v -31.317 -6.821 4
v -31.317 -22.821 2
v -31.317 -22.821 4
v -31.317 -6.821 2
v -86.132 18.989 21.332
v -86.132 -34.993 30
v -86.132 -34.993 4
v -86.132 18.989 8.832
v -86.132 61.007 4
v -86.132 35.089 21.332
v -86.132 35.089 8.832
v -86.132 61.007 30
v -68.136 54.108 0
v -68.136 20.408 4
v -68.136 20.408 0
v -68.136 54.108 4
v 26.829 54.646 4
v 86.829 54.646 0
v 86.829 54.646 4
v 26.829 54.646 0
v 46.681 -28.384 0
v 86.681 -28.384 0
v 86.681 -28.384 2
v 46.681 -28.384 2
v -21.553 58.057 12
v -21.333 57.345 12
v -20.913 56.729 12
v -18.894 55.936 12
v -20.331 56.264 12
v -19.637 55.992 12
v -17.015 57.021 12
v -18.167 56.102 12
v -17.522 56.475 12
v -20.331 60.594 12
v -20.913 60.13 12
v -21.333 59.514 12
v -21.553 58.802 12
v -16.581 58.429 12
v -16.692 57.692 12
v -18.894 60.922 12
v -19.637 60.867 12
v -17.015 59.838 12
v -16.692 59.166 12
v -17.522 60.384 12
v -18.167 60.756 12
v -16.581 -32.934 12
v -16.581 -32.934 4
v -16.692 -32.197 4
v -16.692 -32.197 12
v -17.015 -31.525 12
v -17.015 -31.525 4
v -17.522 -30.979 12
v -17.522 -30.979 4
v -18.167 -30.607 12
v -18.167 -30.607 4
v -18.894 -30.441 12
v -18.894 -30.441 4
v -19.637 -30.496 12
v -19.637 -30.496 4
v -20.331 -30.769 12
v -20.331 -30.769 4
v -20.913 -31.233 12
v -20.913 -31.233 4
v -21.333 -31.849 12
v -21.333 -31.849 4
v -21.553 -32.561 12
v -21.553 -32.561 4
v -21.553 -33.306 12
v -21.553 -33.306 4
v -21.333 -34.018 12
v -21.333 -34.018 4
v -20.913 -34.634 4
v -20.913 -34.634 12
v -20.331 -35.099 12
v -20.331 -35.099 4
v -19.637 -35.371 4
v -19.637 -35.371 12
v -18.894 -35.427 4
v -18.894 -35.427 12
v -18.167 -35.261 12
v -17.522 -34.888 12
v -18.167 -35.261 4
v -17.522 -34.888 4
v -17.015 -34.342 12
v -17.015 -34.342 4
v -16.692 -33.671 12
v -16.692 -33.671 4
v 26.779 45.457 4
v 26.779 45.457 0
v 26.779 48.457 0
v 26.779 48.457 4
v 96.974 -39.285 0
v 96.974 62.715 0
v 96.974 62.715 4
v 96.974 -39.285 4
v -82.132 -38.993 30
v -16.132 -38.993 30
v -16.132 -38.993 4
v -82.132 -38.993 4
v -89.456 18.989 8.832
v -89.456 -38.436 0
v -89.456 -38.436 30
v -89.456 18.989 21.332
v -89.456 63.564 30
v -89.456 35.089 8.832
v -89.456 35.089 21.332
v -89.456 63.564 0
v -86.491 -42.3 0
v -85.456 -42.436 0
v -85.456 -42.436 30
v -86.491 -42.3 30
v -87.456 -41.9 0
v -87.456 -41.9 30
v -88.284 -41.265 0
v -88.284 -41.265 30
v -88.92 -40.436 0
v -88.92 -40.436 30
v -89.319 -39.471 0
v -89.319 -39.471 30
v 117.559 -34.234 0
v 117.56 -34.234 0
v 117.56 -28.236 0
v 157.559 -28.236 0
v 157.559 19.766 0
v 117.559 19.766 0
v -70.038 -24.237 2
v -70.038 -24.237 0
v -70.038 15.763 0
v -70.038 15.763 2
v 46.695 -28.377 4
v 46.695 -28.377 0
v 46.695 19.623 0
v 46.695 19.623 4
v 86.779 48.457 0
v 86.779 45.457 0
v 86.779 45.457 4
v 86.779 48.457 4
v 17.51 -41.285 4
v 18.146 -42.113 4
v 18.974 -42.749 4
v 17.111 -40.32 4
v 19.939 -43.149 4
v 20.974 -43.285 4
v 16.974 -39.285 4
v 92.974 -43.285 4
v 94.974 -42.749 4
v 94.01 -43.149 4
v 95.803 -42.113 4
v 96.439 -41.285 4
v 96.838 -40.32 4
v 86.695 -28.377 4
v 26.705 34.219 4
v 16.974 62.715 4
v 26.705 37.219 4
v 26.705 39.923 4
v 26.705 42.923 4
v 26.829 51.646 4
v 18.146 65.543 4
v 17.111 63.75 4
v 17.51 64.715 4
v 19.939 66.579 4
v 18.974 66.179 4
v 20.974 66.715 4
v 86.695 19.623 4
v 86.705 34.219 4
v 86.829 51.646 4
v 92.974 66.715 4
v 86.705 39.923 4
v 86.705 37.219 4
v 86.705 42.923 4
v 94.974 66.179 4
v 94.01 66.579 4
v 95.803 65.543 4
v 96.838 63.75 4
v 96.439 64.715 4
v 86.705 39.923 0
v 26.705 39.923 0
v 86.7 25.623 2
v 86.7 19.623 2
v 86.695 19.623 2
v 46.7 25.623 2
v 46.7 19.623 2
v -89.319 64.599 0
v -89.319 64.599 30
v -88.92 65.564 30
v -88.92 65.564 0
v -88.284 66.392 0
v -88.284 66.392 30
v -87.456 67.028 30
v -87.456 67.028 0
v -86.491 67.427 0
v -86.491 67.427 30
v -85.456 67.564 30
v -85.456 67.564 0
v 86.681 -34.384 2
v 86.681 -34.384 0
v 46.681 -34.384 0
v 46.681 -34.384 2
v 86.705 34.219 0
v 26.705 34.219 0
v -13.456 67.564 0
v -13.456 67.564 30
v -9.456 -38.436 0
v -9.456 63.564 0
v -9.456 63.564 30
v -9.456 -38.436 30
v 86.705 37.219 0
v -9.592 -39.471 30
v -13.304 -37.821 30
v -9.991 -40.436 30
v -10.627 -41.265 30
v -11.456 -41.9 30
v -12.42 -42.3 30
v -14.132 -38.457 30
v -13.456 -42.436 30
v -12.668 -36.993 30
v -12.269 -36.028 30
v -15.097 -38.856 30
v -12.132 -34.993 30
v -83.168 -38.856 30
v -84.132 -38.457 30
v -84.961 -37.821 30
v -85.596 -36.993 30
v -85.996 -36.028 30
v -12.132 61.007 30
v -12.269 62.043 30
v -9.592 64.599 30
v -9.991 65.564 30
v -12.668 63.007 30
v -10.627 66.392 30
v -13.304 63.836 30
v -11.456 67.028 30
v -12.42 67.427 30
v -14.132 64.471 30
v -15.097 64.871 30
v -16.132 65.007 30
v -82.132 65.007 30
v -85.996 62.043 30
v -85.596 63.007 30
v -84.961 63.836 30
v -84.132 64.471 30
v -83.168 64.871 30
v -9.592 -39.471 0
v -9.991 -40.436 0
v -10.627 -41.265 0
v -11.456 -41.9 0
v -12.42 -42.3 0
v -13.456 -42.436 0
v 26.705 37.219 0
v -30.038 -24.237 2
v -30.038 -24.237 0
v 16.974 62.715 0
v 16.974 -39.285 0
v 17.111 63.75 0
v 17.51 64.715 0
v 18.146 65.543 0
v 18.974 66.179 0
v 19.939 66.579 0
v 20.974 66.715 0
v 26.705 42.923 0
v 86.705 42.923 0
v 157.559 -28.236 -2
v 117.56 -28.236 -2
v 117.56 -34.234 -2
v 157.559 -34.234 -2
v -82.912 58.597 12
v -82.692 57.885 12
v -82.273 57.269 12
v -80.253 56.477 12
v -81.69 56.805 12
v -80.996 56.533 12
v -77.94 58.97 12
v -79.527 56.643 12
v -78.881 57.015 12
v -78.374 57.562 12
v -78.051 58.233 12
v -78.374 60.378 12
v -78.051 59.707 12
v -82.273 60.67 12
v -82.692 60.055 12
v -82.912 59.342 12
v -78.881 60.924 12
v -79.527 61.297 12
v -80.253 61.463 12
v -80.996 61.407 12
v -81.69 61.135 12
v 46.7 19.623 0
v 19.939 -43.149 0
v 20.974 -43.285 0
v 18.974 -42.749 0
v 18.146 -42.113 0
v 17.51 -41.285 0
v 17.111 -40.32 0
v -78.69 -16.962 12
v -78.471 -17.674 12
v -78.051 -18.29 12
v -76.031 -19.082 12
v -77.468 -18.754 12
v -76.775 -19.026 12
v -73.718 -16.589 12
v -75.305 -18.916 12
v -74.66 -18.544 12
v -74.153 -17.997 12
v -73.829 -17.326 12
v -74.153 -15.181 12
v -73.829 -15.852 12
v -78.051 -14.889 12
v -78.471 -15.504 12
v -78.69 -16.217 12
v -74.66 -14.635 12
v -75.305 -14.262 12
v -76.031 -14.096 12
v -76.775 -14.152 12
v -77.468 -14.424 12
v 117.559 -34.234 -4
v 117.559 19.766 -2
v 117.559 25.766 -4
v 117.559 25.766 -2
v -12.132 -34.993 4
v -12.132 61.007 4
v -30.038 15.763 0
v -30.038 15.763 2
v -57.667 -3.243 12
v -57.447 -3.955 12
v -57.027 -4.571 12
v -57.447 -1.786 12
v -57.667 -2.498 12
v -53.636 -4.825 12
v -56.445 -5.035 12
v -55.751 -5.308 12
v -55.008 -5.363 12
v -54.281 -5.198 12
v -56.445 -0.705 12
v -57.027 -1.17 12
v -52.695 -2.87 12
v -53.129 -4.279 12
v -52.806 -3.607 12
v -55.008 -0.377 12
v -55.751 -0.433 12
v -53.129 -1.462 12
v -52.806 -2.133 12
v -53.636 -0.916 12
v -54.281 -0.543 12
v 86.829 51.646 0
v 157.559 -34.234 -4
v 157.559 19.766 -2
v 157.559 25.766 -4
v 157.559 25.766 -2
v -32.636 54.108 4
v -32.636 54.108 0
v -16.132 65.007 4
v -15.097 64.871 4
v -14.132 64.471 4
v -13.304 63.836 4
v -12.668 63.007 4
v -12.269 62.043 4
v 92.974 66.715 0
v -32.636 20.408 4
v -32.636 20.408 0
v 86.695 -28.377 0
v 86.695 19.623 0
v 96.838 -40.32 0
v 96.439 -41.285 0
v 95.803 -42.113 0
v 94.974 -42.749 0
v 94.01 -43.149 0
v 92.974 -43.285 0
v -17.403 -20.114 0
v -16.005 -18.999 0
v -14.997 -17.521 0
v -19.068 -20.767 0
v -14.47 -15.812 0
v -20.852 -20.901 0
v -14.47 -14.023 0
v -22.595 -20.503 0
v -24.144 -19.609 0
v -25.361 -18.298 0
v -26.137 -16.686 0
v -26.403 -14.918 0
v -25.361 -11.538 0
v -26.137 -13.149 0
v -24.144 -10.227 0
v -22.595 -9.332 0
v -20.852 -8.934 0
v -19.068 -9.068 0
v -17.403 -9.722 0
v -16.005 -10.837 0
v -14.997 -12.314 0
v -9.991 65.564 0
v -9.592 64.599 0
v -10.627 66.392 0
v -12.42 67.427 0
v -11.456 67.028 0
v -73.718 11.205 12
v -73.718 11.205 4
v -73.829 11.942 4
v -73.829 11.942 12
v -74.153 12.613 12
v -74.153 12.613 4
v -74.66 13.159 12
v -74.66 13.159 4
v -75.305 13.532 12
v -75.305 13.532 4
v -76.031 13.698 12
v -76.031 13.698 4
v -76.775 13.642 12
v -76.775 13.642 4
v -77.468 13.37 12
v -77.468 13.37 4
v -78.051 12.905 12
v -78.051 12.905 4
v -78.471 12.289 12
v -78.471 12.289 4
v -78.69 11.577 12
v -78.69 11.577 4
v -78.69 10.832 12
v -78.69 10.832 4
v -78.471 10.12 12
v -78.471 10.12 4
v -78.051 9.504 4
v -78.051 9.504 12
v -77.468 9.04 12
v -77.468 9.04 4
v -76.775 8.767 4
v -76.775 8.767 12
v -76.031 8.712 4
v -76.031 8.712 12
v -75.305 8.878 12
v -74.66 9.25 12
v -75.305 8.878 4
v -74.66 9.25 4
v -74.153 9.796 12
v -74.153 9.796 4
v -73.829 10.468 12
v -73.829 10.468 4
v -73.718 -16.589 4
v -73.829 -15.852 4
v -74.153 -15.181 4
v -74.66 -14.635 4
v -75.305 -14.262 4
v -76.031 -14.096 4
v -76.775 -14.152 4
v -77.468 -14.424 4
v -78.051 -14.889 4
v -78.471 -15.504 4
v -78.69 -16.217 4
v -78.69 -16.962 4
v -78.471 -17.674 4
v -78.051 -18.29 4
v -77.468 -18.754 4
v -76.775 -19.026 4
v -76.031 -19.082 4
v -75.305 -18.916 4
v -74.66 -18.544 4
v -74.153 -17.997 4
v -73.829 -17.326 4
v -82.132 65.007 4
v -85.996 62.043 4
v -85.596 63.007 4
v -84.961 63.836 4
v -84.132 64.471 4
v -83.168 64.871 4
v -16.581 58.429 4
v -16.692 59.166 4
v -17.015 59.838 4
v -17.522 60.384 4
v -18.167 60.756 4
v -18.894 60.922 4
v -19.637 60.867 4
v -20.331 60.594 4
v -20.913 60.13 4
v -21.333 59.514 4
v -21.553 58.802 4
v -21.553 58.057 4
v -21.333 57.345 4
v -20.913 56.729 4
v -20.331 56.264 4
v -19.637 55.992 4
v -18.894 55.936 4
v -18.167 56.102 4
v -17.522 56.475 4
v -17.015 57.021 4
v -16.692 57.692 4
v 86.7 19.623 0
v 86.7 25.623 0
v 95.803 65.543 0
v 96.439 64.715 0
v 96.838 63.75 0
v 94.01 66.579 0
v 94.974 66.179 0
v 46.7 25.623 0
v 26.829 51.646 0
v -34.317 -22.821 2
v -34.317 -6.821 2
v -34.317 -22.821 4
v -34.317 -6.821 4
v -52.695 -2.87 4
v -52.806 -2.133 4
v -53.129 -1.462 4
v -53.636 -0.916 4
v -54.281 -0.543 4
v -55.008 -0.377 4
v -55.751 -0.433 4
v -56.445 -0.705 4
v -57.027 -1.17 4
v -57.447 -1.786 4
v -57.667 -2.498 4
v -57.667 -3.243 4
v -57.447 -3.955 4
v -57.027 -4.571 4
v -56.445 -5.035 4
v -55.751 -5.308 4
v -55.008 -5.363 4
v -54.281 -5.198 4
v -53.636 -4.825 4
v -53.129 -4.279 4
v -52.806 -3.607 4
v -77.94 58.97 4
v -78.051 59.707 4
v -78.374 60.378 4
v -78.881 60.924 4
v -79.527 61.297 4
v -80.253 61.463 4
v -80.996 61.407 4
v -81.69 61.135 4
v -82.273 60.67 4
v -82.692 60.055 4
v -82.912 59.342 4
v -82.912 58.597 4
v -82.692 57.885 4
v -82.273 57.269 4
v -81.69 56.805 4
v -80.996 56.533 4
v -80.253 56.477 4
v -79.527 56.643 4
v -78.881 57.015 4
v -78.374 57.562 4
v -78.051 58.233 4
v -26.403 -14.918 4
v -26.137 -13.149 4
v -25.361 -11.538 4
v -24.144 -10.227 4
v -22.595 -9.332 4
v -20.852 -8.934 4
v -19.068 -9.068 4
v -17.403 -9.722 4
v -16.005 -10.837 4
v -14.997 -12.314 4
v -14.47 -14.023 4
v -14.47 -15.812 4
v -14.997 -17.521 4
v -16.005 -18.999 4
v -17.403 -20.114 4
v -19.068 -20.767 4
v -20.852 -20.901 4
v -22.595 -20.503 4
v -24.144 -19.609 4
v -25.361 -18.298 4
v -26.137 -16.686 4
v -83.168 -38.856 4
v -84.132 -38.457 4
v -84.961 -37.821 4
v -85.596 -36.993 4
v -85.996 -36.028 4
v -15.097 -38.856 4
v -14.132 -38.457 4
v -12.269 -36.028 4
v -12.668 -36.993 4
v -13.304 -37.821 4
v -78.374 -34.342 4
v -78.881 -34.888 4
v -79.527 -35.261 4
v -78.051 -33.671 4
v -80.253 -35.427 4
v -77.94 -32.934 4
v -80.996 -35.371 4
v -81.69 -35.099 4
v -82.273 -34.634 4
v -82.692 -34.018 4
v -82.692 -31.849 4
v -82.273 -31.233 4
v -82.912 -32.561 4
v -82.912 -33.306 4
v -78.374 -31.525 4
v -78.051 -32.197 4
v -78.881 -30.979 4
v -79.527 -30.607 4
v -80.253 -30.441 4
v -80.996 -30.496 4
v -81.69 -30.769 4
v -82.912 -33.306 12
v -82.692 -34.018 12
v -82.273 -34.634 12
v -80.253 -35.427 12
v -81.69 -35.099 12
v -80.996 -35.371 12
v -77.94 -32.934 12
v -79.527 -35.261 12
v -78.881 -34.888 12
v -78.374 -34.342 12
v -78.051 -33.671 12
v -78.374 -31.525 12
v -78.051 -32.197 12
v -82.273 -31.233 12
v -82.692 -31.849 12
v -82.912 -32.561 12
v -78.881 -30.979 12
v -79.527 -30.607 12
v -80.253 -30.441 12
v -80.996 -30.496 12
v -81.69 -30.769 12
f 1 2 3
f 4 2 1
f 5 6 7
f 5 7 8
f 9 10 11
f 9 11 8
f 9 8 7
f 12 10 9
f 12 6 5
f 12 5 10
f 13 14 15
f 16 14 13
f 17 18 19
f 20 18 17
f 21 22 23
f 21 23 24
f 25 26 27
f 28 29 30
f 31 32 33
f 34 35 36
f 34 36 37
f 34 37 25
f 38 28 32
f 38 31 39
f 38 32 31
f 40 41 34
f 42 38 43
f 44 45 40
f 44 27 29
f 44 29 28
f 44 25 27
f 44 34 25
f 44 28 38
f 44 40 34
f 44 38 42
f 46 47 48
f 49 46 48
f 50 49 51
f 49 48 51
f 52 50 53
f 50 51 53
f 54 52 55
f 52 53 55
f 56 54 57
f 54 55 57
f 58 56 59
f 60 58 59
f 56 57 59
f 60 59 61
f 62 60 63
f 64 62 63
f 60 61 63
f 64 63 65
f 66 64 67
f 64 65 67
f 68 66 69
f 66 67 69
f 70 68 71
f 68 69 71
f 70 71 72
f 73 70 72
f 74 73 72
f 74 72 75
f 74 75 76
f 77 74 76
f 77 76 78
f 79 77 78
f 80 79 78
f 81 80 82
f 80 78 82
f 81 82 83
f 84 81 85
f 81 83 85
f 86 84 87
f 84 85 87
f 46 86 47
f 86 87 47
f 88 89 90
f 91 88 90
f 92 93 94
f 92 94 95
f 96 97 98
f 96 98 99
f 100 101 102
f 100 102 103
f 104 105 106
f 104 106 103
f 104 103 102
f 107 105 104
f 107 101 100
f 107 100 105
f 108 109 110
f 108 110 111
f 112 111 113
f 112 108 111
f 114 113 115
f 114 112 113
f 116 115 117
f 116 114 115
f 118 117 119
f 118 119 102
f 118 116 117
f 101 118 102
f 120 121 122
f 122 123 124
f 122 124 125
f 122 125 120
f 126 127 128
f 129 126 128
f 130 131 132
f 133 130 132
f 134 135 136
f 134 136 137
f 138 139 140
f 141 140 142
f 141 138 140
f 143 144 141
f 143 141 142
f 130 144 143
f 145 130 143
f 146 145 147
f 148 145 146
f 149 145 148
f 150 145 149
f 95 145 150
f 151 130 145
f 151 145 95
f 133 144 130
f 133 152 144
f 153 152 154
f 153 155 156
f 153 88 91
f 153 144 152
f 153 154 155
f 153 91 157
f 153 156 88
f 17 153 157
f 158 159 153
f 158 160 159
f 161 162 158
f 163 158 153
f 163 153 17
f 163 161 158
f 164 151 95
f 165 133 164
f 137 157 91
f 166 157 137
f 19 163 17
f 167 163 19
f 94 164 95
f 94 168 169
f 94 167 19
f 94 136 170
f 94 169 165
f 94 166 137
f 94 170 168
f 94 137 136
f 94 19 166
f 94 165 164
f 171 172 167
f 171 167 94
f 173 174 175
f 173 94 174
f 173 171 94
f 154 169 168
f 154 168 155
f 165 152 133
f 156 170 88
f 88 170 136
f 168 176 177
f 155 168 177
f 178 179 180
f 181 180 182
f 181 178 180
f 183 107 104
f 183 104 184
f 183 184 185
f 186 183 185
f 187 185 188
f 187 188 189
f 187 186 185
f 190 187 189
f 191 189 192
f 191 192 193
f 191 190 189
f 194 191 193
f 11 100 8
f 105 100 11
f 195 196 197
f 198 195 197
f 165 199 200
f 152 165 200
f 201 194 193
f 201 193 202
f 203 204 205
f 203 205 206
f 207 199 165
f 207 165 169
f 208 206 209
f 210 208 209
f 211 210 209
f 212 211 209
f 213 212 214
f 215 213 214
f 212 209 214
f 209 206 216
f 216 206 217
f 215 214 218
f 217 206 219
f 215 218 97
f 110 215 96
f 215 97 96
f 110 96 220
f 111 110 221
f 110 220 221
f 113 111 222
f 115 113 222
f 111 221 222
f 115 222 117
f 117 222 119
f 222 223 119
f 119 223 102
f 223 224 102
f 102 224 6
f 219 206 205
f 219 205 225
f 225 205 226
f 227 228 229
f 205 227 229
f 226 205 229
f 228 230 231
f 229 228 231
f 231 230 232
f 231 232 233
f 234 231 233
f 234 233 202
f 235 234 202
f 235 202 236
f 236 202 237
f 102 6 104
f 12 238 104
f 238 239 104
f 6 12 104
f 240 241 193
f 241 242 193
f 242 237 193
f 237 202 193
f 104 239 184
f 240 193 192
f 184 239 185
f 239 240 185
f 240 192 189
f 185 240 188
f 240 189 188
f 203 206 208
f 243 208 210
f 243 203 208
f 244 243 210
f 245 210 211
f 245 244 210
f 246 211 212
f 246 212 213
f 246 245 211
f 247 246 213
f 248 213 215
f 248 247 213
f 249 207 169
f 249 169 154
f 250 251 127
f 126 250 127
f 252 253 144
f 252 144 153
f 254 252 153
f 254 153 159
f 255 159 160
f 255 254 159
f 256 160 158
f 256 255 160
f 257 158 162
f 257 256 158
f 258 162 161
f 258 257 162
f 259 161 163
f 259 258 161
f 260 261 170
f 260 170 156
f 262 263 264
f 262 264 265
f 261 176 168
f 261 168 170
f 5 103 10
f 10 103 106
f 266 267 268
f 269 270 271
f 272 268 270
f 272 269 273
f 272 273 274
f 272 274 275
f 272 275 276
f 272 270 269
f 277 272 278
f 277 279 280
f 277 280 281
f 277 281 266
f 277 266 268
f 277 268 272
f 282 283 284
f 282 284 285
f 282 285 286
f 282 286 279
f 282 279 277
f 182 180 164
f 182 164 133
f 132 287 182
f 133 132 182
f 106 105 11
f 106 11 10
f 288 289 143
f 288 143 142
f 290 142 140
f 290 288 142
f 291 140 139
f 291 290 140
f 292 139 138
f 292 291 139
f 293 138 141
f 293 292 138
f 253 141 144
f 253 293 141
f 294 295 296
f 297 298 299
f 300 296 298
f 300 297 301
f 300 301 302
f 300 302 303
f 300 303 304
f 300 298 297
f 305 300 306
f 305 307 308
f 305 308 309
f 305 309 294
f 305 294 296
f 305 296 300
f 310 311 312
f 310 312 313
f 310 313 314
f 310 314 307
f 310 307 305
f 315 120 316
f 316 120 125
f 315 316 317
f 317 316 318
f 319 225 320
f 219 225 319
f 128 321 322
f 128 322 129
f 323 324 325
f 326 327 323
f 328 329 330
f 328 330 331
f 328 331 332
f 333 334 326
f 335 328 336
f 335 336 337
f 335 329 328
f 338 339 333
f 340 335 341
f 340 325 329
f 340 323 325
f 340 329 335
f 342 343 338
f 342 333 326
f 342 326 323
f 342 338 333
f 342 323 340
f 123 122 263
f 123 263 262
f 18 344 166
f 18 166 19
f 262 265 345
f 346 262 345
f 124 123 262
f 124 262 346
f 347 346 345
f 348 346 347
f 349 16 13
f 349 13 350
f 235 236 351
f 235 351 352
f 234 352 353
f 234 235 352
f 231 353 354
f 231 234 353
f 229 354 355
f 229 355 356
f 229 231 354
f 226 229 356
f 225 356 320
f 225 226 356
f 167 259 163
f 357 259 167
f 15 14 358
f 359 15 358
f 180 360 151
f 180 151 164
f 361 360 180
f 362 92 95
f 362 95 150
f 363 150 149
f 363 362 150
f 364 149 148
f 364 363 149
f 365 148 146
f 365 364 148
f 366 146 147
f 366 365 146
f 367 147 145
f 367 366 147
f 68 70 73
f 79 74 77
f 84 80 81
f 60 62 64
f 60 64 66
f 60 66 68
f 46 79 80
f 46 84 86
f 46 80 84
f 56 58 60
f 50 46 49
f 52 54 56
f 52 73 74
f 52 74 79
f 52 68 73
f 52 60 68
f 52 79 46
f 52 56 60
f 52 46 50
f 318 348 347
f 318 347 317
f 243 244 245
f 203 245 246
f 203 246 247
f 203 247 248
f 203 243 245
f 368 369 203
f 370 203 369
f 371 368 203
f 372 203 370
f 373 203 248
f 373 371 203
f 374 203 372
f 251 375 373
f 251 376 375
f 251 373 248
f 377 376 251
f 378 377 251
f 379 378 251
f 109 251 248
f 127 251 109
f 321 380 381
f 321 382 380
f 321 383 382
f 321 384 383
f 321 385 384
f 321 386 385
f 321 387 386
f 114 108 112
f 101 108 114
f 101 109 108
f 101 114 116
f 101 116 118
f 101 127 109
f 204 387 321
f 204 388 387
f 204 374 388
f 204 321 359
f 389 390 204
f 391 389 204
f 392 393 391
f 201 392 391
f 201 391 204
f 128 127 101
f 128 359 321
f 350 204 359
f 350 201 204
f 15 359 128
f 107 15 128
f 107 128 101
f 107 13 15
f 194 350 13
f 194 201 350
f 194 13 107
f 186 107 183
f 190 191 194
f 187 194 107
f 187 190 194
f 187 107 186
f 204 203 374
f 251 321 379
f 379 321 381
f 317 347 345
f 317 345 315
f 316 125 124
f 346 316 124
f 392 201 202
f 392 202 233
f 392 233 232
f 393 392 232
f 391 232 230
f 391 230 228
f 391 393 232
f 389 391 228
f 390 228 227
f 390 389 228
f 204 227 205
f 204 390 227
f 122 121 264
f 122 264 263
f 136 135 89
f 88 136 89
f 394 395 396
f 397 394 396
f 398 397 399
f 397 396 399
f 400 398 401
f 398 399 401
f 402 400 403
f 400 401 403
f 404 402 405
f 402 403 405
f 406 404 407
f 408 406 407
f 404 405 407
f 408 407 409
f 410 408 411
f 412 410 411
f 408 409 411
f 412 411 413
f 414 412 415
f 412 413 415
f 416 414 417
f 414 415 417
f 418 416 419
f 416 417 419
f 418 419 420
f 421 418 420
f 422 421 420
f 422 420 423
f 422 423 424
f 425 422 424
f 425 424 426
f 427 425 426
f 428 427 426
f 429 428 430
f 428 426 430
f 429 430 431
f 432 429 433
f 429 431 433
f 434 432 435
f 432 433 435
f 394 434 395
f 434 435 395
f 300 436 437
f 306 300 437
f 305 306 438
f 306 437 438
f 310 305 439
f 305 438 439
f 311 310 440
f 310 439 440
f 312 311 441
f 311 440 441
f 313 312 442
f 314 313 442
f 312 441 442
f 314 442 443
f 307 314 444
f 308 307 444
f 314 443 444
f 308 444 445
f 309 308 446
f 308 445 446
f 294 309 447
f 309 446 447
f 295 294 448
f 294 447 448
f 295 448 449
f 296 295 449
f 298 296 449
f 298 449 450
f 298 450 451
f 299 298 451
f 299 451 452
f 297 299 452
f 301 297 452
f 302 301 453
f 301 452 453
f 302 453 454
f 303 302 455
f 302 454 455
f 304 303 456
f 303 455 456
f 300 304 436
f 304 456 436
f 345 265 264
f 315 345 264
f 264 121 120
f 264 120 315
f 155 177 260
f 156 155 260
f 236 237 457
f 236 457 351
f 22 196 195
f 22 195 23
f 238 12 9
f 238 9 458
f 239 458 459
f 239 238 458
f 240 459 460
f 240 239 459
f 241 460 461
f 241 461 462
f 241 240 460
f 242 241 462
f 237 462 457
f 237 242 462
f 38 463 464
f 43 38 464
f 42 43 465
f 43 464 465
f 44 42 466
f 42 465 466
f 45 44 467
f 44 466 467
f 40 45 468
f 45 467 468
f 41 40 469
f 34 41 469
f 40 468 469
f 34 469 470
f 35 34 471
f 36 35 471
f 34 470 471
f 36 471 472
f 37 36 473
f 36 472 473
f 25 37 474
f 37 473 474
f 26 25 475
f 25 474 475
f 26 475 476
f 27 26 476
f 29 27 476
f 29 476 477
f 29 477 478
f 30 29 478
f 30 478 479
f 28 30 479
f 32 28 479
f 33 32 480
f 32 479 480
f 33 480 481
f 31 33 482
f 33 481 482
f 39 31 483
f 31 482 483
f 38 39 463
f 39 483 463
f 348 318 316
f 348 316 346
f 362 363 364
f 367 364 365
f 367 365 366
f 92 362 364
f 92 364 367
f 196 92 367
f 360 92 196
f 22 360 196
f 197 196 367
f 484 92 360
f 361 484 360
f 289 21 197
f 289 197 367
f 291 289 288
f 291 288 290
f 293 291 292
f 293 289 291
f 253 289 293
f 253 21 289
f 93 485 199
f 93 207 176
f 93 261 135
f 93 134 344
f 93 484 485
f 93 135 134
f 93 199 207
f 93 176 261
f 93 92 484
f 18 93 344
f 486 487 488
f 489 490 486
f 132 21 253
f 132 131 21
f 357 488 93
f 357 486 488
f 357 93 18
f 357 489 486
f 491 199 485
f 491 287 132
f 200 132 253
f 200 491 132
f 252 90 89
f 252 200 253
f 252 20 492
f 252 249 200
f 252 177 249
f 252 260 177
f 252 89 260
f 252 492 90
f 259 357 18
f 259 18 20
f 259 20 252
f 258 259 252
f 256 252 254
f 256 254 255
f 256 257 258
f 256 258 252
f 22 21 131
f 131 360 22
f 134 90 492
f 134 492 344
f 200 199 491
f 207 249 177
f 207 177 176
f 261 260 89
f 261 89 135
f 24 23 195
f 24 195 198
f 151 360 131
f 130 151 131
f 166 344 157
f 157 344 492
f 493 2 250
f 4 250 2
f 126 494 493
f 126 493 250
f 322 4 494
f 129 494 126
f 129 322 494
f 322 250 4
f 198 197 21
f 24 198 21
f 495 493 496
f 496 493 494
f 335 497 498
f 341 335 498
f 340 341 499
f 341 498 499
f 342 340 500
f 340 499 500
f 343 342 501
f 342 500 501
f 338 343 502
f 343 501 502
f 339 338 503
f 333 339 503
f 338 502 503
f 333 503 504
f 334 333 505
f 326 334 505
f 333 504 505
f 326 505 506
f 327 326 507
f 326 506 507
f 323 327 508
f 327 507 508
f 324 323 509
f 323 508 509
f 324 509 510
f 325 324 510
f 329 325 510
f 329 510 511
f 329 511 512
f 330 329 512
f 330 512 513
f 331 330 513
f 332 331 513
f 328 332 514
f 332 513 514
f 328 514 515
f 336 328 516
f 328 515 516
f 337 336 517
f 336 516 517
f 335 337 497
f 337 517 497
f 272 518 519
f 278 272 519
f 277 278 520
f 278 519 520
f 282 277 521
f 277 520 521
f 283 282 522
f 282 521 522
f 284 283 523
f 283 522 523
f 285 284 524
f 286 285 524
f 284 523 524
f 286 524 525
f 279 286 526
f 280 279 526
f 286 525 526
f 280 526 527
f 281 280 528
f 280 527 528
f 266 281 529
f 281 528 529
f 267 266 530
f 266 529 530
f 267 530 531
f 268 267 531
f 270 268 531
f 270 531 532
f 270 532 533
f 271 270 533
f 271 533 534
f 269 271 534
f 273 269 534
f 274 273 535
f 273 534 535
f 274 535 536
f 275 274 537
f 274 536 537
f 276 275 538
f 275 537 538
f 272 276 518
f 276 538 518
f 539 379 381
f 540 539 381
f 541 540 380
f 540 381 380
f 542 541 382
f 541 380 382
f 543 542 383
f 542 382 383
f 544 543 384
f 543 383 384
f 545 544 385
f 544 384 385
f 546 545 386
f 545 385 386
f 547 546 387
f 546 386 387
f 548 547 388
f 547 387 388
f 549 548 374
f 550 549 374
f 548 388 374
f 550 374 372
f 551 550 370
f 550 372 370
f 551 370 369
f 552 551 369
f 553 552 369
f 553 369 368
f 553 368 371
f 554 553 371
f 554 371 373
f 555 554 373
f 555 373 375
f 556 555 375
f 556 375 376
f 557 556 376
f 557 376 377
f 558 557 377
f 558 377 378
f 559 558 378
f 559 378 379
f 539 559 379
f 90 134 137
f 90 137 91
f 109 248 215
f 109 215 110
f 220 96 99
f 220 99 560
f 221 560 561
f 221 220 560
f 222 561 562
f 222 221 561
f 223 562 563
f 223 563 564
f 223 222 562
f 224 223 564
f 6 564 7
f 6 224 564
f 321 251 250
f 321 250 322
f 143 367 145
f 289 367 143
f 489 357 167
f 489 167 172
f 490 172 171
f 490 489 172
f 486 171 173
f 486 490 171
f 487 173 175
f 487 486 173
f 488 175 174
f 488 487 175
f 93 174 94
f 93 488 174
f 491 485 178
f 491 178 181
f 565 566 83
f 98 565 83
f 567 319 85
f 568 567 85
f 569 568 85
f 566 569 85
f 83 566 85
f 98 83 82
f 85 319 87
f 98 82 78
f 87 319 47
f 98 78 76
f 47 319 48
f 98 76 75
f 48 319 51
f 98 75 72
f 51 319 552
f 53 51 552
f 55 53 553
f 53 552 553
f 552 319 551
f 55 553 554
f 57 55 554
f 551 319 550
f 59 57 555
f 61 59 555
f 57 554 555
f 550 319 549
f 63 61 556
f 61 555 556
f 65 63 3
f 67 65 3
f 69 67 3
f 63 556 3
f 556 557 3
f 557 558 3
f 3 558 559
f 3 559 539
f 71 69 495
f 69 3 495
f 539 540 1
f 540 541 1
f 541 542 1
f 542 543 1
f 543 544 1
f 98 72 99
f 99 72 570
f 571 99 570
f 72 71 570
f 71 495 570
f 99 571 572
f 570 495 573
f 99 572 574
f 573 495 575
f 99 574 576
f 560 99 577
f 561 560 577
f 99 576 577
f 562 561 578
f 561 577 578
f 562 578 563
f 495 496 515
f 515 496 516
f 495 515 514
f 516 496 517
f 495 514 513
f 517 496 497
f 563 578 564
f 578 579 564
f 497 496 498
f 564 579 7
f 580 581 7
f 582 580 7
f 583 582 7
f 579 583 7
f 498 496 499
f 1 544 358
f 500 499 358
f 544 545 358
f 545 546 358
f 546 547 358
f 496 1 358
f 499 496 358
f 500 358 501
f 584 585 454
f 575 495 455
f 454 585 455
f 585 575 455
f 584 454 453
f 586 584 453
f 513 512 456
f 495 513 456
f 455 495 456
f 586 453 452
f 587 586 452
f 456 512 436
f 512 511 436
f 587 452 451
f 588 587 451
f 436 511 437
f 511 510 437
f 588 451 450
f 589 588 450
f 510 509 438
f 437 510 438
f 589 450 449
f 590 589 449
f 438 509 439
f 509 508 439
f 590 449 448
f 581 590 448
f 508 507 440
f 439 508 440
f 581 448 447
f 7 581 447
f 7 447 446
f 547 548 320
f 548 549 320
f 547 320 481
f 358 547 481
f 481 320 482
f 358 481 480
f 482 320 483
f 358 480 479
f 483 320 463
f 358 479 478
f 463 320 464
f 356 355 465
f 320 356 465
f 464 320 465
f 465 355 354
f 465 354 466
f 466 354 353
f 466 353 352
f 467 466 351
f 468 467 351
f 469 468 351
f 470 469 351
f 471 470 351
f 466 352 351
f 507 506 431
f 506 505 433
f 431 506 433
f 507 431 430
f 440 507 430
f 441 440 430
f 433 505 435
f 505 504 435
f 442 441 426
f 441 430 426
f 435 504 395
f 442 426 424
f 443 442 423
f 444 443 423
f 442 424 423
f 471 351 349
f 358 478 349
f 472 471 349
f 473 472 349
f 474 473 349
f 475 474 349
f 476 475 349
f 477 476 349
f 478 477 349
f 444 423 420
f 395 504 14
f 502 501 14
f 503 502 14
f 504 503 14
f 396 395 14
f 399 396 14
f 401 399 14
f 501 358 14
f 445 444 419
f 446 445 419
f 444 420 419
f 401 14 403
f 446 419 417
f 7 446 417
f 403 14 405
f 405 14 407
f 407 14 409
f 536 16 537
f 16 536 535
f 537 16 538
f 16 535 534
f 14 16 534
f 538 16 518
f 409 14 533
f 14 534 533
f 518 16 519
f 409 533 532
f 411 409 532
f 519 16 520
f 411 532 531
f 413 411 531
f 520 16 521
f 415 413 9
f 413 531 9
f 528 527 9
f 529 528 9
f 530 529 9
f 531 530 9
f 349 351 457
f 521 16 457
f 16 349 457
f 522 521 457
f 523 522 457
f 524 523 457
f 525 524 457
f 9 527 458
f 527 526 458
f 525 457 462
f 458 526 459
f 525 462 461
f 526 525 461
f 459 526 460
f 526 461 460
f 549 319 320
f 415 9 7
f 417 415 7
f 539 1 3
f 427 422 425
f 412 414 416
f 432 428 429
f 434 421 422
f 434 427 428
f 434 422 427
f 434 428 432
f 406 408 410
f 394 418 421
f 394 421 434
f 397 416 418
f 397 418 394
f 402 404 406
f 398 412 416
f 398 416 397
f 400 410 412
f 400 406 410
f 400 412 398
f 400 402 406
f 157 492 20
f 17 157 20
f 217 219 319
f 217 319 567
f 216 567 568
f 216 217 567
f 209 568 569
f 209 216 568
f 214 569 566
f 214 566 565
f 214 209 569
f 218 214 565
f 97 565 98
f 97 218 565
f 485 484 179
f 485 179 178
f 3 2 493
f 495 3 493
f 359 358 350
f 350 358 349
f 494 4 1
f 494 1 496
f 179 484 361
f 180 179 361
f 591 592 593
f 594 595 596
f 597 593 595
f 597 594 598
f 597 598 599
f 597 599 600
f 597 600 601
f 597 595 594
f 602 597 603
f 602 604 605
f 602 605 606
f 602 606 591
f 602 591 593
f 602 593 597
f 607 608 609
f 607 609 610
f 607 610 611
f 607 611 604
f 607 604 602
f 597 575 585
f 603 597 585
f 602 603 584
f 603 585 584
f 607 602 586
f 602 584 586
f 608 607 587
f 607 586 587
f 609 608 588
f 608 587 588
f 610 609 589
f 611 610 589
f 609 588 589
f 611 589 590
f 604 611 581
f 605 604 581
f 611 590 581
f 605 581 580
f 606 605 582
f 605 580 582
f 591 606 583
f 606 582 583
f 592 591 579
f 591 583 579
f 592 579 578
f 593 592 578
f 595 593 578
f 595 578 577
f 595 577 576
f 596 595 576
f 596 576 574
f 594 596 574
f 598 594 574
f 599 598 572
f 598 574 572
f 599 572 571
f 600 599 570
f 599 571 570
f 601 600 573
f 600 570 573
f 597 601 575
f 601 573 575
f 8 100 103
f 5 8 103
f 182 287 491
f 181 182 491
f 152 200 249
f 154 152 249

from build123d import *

# Parameters (mm, degrees)
BOSS_EXTRUDE1_DEPTH     = 30
BOSS_EXTRUDE1_2_DEPTH   = 30
CUT_EXTRUDE1_DEPTH      = 30
CUT_EXTRUDE1_DEPTH_BACK = 30
SKETCH2_W               = 35.5
SKETCH2_H               = 33.7
CUT_EXTRUDE3_DEPTH      = 26
SKETCH6_R               = 2.5
BOSS_EXTRUDE4_DEPTH     = 8
SKETCH7_W               = 40
SKETCH7_H               = 40
CUT_EXTRUDE4_DEPTH      = 2
SKETCH8_W               = 3
SKETCH8_H               = 16
CUT_EXTRUDE6_DEPTH      = 10
SKETCH9_R               = 6
CUT_EXTRUDE7_DEPTH      = 10
SKETCH10_W              = 12.5
SKETCH10_H              = 16.1
CUT_EXTRUDE8_DEPTH      = 10
SKETCH11_W              = 95.321687865
SKETCH11_H              = 120.330039434
CUT_EXTRUDE9_DEPTH      = 26
SKETCH12_W              = 60
SKETCH12_H              = 3
CUT_EXTRUDE10_DEPTH     = 10
SKETCH13_W              = 40
SKETCH13_H              = 48
CUT_EXTRUDE11_DEPTH     = 10
SKETCH14_W              = 40
SKETCH14_H              = 60
BOSS_EXTRUDE5_DEPTH     = 4
SKETCH15_W              = 40
SKETCH15_H              = 6
CUT_EXTRUDE12_DEPTH     = 2
SKETCH16_W              = 40
SKETCH16_H              = 6
CUT_EXTRUDE16_DEPTH     = 2


with BuildPart() as part:
    # Sketch1 → Boss-Extrude1 (new body)
    with BuildSketch(Plane.XY):
        with BuildLine():
            Line((20.974483597, 66.715066829), (92.974483597, 66.715066829))
            ThreePointArc((92.974483597, 66.715066829), (95.802910721, 65.543493953), (96.974483597, 62.715066829))
            Line((96.974483597, 62.715066829), (96.974483597, -39.284933171))
            ThreePointArc((96.974483597, -39.284933171), (95.802910721, -42.113360296), (92.974483597, -43.284933171))
            Line((92.974483597, -43.284933171), (20.974483597, -43.284933171))
            ThreePointArc((20.974483597, -43.284933171), (18.146056472, -42.113360296), (16.974483597, -39.284933171))
            Line((16.974483597, -39.284933171), (16.974483597, 62.715066829))
            ThreePointArc((16.974483597, 62.715066829), (18.146056472, 65.543493953), (20.974483597, 66.715066829))
        make_face()
    extrude(amount=BOSS_EXTRUDE1_DEPTH)


with BuildPart() as body_2:
    # Sketch1 → Boss-Extrude1 2 (new body)
    with BuildSketch(Plane.XY):
        with BuildLine():
            Line((-85.455528554, 67.563791009), (-13.455528554, 67.563791009))
            ThreePointArc((-13.455528554, 67.563791009), (-10.627101429, 66.392218133), (-9.455528554, 63.563791009))
            Line((-9.455528554, 63.563791009), (-9.455528554, -38.436208991))
            ThreePointArc((-9.455528554, -38.436208991), (-10.627101429, -41.264636116), (-13.455528554, -42.436208991))
            Line((-13.455528554, -42.436208991), (-85.455528554, -42.436208991))
            ThreePointArc((-85.455528554, -42.436208991), (-88.283955679, -41.264636116), (-89.455528554, -38.436208991))
            Line((-89.455528554, -38.436208991), (-89.455528554, 63.563791009))
            ThreePointArc((-89.455528554, 63.563791009), (-88.283955679, 66.392218133), (-85.455528554, 67.563791009))
        make_face()
    extrude(amount=BOSS_EXTRUDE1_2_DEPTH)

    # Sketch2 → Cut-Extrude1 (cut, two sides: drawn at the far end of the back side and taken through both)
    with BuildSketch(Plane.XY.offset(30).offset(-CUT_EXTRUDE1_DEPTH_BACK)):
        with Locations((-50.386245778, 37.25801999)):
            Rectangle(SKETCH2_W, SKETCH2_H)
    extrude(amount=CUT_EXTRUDE1_DEPTH + CUT_EXTRUDE1_DEPTH_BACK, mode=Mode.SUBTRACT)


with BuildPart() as cut_extrude3_tool:
    # Sketch4 → Cut-Extrude3 (new body)
    with BuildSketch(Plane.XY.offset(30)):
        with BuildLine():
            Line((23.91157104, 63.897821022), (89.91157104, 63.897821022))
            ThreePointArc((89.91157104, 63.897821022), (92.739998164, 62.726248147), (93.91157104, 59.897821022))
            Line((93.91157104, 59.897821022), (93.91157104, -36.102178978))
            ThreePointArc((93.91157104, -36.102178978), (92.739998164, -38.930606103), (89.91157104, -40.102178978))
            Line((89.91157104, -40.102178978), (23.91157104, -40.102178978))
            ThreePointArc((23.91157104, -40.102178978), (21.083143915, -38.930606103), (19.91157104, -36.102178978))
            Line((19.91157104, -36.102178978), (19.91157104, 59.897821022))
            ThreePointArc((19.91157104, 59.897821022), (21.083143915, 62.726248147), (23.91157104, 63.897821022))
        make_face()
        with BuildLine():
            Line((-82.132362374, 65.007321048), (-16.132362374, 65.007321048))
            ThreePointArc((-16.132362374, 65.007321048), (-13.303935249, 63.835748173), (-12.132362374, 61.007321048))
            Line((-12.132362374, 61.007321048), (-12.132362374, -34.992678952))
            ThreePointArc((-12.132362374, -34.992678952), (-13.303935249, -37.821106077), (-16.132362374, -38.992678952))
            Line((-16.132362374, -38.992678952), (-82.132362374, -38.992678952))
            ThreePointArc((-82.132362374, -38.992678952), (-84.960789499, -37.821106077), (-86.132362374, -34.992678952))
            Line((-86.132362374, -34.992678952), (-86.132362374, 61.007321048))
            ThreePointArc((-86.132362374, 61.007321048), (-84.960789499, 63.835748173), (-82.132362374, 65.007321048))
        make_face()
    extrude(amount=-CUT_EXTRUDE3_DEPTH)


with BuildPart() as part_1:
    add(part.part)

    # Cut-Extrude3: cut by cut_extrude3_tool
    add(cut_extrude3_tool.part, mode=Mode.SUBTRACT)

    # Sketch11 → Cut-Extrude9 (cut)
    with BuildSketch(Plane.XY.offset(30)):
        with Locations((57.581799377, 11.372053132)):
            Rectangle(SKETCH11_W, SKETCH11_H)
    extrude(amount=-CUT_EXTRUDE9_DEPTH, mode=Mode.SUBTRACT)

    # Sketch12 → Cut-Extrude10 (cut)
    with BuildSketch(Plane(origin=(0, 0, 0), x_dir=(-1, 0, 0), z_dir=(0, 0, -1))):
        with Locations((-56.77947587, 46.957115984)):
            Rectangle(SKETCH12_W, SKETCH12_H)
        with Locations((-56.829034644, 53.146498435)):
            Rectangle(SKETCH12_W, SKETCH12_H)
        with Locations((-56.705135858, 41.423213074)):
            Rectangle(SKETCH12_W, SKETCH12_H)
        with Locations((-56.705135858, 35.718618338)):
            Rectangle(SKETCH12_W, SKETCH12_H)
    extrude(amount=-CUT_EXTRUDE10_DEPTH, mode=Mode.SUBTRACT)

    # Sketch13 → Cut-Extrude11 (cut)
    with BuildSketch(Plane(origin=(0, 0, 0), x_dir=(-1, 0, 0), z_dir=(0, 0, -1))):
        with Locations((-66.695382207, -4.37674857)):
            Rectangle(SKETCH13_W, SKETCH13_H)
    extrude(amount=-CUT_EXTRUDE11_DEPTH, mode=Mode.SUBTRACT)

    # Sketch15 → Cut-Extrude12 (cut)
    with BuildSketch(Plane(origin=(0, 0, 0), x_dir=(-1, 0, 0), z_dir=(0, 0, -1))):
        with Locations((-66.699810311, 22.62325143)):
            Rectangle(SKETCH15_W, SKETCH15_H)
        with Locations((-66.680744565, -31.383516818)):
            Rectangle(SKETCH15_W, SKETCH15_H)
    extrude(amount=-CUT_EXTRUDE12_DEPTH, mode=Mode.SUBTRACT)


with BuildPart() as body_2_1:
    add(body_2.part)

    # Cut-Extrude3: cut by cut_extrude3_tool
    add(cut_extrude3_tool.part, mode=Mode.SUBTRACT)

    # Sketch6 → Boss-Extrude4 (add)
    with BuildSketch(Plane.XY.offset(4)):
        with Locations((-80.439971439, 58.969820131)):
            Circle(SKETCH6_R)
        with Locations((-80.439971439, -32.933759837)):
            Circle(SKETCH6_R)
        with Locations((-19.080816578, 58.429210837)):
            Circle(SKETCH6_R)
        with Locations((-19.080816578, -32.933759837)):
            Circle(SKETCH6_R)
        with Locations((-76.2182608, -16.589165255)):
            Circle(SKETCH6_R)
        with Locations((-76.2182608, 11.204722955)):
            Circle(SKETCH6_R)
        with Locations((-55.194678693, -2.8703871)):
            Circle(SKETCH6_R)
    extrude(amount=BOSS_EXTRUDE4_DEPTH)

    # Sketch7 → Cut-Extrude4 (cut)
    with BuildSketch(Plane(origin=(0, 0, 0), x_dir=(-1, 0, 0), z_dir=(0, 0, -1))):
        with Locations((50.037991375, -4.23667758)):
            Rectangle(SKETCH7_W, SKETCH7_H)
    extrude(amount=-CUT_EXTRUDE4_DEPTH, mode=Mode.SUBTRACT)

    # Sketch8 → Cut-Extrude6 (cut)
    with BuildSketch(Plane(origin=(0, 0, 2), x_dir=(-1, 0, 0), z_dir=(0, 0, -1))):
        with Locations((32.817132527, -14.820749727)):
            Rectangle(SKETCH8_W, SKETCH8_H)
    extrude(amount=-CUT_EXTRUDE6_DEPTH, mode=Mode.SUBTRACT)

    # Sketch9 → Cut-Extrude7 (cut)
    with BuildSketch(Plane(origin=(0, 0, 0), x_dir=(-1, 0, 0), z_dir=(0, 0, -1))):
        with Locations((20.403181, -14.917714738)):
            Circle(SKETCH9_R)
    extrude(amount=-CUT_EXTRUDE7_DEPTH, mode=Mode.SUBTRACT)

    # Sketch10 → Cut-Extrude8 (cut)
    with BuildSketch(Plane.ZY.offset(89.455528554)):
        with Locations((15.082452047, 27.039311298)):
            Rectangle(SKETCH10_W, SKETCH10_H)
    extrude(amount=-CUT_EXTRUDE8_DEPTH, mode=Mode.SUBTRACT)


with BuildPart() as body_3:
    # Sketch14 → Boss-Extrude5 (new body)
    with BuildSketch(Plane(origin=(3.927933069, 1.340530515, 0), x_dir=(-1, 0, 0), z_dir=(0, 0, -1))):
        with Locations((-133.631501649, -5.574519781)):
            Rectangle(SKETCH14_W, SKETCH14_H)
    extrude(amount=BOSS_EXTRUDE5_DEPTH)

    # Sketch16 → Cut-Extrude16 (cut)
    with BuildSketch(Plane.XY):
        with Locations((137.559434718, 22.766010733)):
            Rectangle(SKETCH16_W, SKETCH16_H)
        with Locations((137.560044489, -31.236499994)):
            Rectangle(SKETCH16_W, SKETCH16_H)
    extrude(amount=-CUT_EXTRUDE16_DEPTH, mode=Mode.SUBTRACT)


solid = Compound([part_1.part, body_2_1.part, body_3.part])
